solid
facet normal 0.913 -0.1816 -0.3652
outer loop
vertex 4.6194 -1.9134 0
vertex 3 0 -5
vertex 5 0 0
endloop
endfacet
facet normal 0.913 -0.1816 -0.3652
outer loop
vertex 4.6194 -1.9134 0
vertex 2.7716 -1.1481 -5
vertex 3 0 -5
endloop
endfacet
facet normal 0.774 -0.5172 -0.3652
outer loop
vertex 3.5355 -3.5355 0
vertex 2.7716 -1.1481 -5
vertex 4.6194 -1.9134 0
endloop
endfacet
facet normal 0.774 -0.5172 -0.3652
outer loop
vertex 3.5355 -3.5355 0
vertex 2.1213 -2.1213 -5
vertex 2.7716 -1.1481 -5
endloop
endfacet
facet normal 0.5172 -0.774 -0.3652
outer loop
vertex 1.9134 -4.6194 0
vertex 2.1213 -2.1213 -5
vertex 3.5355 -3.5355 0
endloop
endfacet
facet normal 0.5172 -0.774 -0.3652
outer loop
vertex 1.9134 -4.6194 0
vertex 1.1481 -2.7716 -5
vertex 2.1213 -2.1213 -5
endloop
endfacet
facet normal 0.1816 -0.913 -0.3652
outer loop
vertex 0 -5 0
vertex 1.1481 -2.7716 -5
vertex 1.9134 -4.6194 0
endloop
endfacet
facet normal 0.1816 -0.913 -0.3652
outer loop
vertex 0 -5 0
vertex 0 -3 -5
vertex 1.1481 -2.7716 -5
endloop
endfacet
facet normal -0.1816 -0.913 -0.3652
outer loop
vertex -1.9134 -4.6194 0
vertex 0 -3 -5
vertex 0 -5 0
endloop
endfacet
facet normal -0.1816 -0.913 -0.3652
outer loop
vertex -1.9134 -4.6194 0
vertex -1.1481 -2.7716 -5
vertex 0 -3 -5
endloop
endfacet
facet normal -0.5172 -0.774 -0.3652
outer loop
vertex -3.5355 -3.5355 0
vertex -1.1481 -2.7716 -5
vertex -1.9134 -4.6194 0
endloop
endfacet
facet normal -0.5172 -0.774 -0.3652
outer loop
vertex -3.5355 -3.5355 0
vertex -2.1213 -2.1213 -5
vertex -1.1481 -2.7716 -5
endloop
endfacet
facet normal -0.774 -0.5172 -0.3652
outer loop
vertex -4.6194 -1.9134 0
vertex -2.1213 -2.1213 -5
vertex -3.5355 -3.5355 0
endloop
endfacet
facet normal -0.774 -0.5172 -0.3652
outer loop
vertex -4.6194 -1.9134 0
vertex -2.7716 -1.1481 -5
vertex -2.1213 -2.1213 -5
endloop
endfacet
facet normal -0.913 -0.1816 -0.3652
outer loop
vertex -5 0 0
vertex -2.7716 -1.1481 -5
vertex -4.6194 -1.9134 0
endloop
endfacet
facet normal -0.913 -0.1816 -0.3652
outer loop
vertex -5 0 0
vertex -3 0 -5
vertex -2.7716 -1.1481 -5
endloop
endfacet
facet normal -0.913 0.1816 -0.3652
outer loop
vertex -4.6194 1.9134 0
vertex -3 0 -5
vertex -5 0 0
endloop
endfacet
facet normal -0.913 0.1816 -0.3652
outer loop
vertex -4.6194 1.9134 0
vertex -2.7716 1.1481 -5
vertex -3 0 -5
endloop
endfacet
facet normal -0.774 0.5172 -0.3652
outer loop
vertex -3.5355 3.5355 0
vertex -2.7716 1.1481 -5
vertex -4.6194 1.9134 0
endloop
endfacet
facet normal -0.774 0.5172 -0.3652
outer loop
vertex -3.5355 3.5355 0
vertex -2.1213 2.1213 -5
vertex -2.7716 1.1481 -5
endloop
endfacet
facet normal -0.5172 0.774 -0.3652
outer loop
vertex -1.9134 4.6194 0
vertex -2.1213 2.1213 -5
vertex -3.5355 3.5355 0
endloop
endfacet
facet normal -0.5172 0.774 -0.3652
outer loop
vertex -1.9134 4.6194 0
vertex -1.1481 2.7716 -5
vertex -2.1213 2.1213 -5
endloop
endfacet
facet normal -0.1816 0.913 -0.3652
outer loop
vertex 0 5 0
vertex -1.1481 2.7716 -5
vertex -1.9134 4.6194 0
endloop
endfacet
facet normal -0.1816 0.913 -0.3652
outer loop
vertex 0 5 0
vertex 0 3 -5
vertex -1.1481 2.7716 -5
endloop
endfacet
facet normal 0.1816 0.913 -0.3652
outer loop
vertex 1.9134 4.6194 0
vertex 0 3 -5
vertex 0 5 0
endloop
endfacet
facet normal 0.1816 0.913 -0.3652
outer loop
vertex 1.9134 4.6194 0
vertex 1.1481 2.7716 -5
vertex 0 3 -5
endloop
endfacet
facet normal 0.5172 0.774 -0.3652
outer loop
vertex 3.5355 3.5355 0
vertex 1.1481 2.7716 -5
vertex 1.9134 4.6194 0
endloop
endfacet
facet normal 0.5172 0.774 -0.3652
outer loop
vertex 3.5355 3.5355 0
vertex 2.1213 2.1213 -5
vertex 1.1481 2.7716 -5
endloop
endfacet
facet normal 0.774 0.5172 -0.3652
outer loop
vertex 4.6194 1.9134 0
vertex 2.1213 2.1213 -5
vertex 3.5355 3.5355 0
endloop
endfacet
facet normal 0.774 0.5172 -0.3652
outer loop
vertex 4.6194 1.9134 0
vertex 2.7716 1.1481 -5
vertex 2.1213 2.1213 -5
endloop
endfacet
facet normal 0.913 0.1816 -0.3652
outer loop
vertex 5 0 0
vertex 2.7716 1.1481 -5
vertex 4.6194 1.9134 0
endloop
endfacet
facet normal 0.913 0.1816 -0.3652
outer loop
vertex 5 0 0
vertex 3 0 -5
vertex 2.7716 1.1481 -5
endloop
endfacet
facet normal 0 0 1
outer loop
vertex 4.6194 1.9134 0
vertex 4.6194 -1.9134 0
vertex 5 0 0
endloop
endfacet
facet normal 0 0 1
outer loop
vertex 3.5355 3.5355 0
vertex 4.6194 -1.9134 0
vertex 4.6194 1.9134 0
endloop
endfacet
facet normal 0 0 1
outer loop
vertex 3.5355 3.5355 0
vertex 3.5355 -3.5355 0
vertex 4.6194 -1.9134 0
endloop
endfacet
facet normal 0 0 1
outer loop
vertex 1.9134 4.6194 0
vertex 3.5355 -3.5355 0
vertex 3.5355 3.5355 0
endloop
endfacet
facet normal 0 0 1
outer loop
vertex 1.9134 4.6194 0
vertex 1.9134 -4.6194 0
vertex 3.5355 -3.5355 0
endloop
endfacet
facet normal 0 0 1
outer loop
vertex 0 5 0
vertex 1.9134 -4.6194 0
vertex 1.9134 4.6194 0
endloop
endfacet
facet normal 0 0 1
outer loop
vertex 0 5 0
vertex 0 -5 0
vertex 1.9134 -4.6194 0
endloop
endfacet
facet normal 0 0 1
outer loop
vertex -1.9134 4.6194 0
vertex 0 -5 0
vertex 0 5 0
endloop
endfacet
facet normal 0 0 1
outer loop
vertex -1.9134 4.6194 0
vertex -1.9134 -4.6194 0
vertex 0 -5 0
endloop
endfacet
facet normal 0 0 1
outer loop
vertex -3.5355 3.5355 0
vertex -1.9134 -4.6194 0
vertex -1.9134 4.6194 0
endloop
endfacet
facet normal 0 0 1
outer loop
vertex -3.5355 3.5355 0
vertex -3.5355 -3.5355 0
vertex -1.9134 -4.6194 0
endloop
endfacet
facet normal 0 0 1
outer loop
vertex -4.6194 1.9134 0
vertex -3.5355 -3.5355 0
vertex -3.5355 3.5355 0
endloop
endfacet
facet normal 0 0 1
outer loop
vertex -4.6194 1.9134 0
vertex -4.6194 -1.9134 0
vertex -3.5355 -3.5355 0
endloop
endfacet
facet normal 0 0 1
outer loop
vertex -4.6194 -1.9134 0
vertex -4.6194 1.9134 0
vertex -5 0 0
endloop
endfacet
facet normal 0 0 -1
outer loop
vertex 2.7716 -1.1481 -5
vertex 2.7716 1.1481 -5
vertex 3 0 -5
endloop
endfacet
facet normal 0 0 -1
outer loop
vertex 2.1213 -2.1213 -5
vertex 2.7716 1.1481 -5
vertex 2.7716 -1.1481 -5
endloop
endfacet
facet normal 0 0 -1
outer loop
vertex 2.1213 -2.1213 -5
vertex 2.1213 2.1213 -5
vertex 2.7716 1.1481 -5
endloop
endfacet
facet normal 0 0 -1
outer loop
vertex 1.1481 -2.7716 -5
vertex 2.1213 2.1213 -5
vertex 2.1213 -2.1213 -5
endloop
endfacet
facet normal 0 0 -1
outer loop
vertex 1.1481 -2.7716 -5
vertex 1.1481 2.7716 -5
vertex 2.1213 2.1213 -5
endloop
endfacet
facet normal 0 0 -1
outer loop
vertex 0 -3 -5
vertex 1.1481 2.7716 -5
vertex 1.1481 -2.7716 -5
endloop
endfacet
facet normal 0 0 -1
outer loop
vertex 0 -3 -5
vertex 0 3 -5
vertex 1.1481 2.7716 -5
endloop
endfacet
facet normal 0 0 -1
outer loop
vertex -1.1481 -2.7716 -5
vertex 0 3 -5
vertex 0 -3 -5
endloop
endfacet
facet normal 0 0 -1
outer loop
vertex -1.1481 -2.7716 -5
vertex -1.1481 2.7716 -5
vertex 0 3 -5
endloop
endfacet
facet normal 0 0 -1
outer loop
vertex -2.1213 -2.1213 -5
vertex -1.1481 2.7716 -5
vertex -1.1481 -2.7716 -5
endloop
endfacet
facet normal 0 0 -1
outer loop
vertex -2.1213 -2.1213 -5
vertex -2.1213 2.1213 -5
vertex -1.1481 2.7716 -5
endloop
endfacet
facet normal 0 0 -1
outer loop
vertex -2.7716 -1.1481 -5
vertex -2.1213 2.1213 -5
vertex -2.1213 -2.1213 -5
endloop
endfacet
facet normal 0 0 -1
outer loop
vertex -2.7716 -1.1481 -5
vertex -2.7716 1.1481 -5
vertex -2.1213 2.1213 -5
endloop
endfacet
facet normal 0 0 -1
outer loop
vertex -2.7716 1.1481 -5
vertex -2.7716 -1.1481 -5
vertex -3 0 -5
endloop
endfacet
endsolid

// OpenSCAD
rotate(a = [ 180, 0, 0])
cylinder(r1 = 5, r2 = 3, h = 5, center = false);
